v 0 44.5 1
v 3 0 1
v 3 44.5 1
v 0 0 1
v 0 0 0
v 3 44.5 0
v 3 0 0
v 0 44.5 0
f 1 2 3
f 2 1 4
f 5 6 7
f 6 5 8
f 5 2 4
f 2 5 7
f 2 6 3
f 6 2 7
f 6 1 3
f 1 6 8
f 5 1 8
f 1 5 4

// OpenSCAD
//LDRWedge.scad (c) by Embecosm Ltd.
//
//LDRWedge.scad is licensed under a
//Creative Commons Attribution-ShareAlike 4.0 International License.
//
//You should have received a copy of the license along with this
//work. If not, see <http://creativecommons.org/licenses/by-sa/4.0/>.

cube([3,44.5,1]);
